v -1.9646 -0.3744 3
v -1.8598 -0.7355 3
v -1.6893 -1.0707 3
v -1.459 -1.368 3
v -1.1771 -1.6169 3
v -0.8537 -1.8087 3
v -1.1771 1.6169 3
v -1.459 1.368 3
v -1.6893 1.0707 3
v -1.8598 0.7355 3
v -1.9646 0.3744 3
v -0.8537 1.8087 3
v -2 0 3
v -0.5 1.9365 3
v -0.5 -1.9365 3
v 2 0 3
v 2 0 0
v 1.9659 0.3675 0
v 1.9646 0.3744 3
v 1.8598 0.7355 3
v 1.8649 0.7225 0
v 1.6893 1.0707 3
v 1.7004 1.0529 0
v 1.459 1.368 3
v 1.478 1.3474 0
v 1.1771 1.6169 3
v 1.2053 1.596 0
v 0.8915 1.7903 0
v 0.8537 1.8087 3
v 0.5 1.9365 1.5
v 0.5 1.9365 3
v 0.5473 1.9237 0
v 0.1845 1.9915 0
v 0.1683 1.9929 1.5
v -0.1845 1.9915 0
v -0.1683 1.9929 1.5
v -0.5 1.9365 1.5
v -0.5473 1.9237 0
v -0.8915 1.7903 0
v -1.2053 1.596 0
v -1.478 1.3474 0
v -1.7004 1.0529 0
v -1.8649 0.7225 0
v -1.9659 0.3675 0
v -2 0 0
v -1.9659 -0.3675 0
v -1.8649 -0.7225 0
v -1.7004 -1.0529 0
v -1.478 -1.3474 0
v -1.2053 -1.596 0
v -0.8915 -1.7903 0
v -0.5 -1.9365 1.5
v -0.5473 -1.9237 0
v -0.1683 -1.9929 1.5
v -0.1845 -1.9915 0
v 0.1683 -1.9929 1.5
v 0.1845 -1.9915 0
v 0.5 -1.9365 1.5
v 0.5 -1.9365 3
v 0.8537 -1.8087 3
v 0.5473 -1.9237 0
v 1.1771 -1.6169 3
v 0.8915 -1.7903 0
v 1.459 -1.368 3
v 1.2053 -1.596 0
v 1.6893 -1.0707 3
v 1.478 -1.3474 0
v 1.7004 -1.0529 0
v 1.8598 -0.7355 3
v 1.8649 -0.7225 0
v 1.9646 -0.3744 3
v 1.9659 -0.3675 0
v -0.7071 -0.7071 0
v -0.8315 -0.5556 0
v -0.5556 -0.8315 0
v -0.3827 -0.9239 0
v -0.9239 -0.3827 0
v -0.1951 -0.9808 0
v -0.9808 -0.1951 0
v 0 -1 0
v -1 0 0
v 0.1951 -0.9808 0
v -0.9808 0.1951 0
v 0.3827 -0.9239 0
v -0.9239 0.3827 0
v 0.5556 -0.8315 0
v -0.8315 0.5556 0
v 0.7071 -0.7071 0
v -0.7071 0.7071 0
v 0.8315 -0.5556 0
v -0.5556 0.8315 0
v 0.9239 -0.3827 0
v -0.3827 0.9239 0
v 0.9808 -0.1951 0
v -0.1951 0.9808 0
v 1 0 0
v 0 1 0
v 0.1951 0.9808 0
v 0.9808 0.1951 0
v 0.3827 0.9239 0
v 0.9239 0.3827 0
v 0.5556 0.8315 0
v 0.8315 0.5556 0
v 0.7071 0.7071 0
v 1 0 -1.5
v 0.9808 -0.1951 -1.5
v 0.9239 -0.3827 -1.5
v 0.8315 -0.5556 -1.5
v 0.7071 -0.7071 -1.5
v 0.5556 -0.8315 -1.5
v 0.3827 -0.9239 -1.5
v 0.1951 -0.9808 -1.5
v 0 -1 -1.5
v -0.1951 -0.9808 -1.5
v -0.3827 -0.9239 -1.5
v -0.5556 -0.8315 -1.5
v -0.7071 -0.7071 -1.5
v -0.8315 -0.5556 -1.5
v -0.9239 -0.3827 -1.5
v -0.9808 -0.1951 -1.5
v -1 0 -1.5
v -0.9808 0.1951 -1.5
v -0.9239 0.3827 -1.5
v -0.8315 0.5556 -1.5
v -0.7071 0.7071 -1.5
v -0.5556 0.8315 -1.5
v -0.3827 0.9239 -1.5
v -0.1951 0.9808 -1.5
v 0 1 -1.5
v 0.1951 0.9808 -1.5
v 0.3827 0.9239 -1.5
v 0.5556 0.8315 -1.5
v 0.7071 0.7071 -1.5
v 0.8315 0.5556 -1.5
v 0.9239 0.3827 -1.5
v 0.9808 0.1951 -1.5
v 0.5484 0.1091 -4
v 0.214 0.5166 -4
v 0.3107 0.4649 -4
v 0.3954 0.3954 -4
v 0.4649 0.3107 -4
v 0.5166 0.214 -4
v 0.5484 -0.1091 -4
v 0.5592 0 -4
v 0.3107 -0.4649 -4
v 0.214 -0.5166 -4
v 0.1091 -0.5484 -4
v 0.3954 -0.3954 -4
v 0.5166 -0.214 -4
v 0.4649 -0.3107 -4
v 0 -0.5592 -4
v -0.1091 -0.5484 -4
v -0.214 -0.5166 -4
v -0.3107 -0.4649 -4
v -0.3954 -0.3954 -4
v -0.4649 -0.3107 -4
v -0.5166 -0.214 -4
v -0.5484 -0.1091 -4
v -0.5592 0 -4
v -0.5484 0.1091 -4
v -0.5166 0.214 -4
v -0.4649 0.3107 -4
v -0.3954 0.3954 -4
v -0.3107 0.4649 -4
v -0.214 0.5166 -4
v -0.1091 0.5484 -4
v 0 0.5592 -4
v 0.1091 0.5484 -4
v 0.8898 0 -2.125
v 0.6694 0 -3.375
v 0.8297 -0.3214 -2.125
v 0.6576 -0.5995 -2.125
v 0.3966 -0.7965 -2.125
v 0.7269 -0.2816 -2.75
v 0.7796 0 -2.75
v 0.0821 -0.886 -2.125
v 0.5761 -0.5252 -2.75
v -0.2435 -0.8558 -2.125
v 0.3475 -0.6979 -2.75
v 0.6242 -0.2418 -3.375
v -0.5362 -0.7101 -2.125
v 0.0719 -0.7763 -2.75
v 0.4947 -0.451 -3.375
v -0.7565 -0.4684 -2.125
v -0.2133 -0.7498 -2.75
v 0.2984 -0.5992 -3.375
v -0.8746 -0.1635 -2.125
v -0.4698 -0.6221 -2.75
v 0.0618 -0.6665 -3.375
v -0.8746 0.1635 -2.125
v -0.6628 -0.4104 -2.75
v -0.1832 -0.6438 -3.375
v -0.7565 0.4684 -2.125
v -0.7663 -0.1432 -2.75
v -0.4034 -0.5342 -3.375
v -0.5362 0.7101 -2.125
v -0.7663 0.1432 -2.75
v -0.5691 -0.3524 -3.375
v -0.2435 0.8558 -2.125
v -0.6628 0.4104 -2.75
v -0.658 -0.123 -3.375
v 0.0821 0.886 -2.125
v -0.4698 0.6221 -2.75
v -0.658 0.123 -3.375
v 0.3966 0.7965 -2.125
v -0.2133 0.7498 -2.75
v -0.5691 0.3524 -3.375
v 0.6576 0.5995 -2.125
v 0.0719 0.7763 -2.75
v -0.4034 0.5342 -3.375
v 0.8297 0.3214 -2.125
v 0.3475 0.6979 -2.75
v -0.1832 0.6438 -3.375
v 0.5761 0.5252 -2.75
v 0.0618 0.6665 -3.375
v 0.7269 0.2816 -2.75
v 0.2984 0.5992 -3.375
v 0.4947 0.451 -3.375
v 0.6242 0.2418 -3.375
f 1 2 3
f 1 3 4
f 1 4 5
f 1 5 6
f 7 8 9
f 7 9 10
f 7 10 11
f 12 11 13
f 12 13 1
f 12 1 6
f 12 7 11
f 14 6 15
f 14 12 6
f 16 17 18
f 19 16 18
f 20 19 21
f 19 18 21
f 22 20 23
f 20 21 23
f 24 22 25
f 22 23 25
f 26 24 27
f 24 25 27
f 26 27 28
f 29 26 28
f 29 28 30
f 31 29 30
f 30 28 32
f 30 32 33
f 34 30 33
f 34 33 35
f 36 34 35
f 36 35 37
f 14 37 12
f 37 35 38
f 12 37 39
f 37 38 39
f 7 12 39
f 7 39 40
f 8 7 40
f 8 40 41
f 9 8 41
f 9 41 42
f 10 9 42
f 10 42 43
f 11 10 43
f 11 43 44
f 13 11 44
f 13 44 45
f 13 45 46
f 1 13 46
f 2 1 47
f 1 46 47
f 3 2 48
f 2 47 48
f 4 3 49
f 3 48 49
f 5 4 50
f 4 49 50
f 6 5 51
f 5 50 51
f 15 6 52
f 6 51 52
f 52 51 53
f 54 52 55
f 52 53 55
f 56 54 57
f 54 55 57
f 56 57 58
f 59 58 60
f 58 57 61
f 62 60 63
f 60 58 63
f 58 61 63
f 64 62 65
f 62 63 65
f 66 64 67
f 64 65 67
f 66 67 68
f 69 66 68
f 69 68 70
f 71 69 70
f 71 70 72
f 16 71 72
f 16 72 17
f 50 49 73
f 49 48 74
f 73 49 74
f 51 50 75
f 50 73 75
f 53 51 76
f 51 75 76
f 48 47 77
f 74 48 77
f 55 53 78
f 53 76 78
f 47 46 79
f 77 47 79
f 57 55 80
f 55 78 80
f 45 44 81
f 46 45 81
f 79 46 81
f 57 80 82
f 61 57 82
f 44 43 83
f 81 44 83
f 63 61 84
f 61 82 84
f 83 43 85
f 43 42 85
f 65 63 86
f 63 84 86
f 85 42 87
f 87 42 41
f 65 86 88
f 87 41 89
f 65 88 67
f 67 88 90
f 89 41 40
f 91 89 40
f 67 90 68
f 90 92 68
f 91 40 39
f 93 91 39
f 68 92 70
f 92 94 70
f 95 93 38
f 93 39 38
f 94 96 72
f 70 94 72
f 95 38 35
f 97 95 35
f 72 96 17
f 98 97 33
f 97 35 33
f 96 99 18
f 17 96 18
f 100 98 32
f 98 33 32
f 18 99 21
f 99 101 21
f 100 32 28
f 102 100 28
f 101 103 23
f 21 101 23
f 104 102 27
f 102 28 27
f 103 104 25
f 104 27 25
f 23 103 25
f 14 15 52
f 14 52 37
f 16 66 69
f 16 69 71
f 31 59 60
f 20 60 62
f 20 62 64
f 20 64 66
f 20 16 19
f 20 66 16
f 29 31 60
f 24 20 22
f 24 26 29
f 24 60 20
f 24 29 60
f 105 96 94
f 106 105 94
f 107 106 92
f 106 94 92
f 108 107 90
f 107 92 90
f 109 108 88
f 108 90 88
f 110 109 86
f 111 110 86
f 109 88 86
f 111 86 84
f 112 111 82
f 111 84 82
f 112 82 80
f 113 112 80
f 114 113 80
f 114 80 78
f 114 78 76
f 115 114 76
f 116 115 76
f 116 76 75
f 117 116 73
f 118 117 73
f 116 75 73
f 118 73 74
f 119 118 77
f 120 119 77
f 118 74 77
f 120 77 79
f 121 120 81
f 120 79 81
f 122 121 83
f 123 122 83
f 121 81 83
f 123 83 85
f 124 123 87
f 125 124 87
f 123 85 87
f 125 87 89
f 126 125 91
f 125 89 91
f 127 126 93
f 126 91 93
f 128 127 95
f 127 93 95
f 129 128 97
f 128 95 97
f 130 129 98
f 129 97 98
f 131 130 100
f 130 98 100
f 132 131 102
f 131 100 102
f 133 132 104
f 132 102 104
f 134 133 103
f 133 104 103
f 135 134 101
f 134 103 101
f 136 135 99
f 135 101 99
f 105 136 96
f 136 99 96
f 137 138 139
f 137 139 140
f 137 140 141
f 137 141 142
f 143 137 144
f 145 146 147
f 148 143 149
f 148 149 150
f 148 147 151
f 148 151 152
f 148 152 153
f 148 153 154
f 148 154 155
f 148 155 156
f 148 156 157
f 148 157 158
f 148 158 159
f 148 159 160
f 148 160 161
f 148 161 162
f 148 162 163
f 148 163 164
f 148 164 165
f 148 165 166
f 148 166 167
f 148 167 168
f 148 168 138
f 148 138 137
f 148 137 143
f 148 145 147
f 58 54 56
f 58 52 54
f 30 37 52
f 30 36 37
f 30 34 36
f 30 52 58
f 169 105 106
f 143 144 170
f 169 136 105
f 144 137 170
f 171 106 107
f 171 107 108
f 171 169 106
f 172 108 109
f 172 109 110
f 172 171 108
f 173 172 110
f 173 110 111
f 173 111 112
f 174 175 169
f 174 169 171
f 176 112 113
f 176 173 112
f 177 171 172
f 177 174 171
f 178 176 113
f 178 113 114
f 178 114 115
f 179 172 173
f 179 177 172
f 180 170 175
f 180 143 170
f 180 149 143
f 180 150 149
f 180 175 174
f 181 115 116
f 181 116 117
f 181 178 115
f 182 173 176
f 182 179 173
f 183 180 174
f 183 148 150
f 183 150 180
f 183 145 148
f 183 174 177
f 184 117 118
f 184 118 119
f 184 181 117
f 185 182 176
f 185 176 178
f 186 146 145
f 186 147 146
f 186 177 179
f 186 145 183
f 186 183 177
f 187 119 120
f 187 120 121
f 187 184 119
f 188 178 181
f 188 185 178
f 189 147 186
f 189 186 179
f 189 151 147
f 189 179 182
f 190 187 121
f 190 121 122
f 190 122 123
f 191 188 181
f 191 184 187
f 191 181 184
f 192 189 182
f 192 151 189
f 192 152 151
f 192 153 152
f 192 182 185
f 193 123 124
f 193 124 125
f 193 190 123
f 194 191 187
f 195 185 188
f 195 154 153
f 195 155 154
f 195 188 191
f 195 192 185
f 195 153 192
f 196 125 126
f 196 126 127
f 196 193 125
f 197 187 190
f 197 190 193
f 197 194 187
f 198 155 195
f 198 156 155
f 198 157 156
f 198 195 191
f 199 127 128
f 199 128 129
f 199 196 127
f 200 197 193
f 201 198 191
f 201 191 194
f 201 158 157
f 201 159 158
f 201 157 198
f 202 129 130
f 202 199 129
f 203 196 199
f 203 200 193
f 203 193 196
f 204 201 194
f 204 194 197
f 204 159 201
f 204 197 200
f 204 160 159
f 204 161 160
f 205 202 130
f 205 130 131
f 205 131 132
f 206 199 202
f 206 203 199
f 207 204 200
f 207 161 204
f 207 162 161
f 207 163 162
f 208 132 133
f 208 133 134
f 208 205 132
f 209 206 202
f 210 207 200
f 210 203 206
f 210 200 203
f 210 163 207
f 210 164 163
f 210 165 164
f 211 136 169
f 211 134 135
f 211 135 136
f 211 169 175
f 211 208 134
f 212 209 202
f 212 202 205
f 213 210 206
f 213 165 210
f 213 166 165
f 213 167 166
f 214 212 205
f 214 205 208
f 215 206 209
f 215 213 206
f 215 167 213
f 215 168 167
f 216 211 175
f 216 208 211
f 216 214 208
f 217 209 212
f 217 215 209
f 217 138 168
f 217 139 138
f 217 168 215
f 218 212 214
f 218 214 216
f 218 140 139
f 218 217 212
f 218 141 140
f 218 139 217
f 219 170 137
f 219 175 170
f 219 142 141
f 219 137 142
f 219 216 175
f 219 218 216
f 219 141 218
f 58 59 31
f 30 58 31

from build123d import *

# Parameters (mm, degrees)
ESQUISSE1_R                     = 2
BASE_EXTRUSION_DEPTH            = 3
ESQUISSE2_R                     = 1
BOSS_EXTRU_1_DEPTH              = 4
CHANFREIN2_SIZE                 = 2.5
CHANFREIN2_SIZE2                = 0.440817452
ESQUISSE3_W                     = 1
ESQUISSE3_H                     = 4.690148878
ENL_V_DE_MAT_EXTRU_MINCE1_DEPTH = 1.5


with BuildPart() as part:
    # Esquisse1 → Base-Extrusion (new body)
    with BuildSketch(Plane.XY):
        Circle(ESQUISSE1_R)
    extrude(amount=BASE_EXTRUSION_DEPTH)

    # Esquisse2 → Boss.-Extru.1 (add)
    with BuildSketch(Plane(origin=(0, 0, 0), x_dir=(-1, 0, 0), z_dir=(0, 0, -1))):
        with Locations(Location((0, 0, 0), (0, 0, 180))):
            Circle(ESQUISSE2_R)
    extrude(amount=BOSS_EXTRU_1_DEPTH)

    # Chanfrein2
    chanfrein2_edges = [part.edges().sort_by_distance(p)[0] for p in [
        (-1, 0, -4),
    ]]
    chanfrein2_side = [part.faces().sort_by_distance(p)[0] for p in [
        (-1, 0, -2),
    ]]
    chamfer(chanfrein2_edges, length=CHANFREIN2_SIZE, length2=CHANFREIN2_SIZE2, reference=chanfrein2_side[0])

    # Esquisse3 → Enlèv. de mat.-Extru.-Mince1 (cut)
    with BuildSketch(Plane.XY.offset(3)):
        with Locations((0, -0.083649642)):
            Rectangle(ESQUISSE3_W, ESQUISSE3_H)
    extrude(amount=-ENL_V_DE_MAT_EXTRU_MINCE1_DEPTH, mode=Mode.SUBTRACT)


solid = part.part
